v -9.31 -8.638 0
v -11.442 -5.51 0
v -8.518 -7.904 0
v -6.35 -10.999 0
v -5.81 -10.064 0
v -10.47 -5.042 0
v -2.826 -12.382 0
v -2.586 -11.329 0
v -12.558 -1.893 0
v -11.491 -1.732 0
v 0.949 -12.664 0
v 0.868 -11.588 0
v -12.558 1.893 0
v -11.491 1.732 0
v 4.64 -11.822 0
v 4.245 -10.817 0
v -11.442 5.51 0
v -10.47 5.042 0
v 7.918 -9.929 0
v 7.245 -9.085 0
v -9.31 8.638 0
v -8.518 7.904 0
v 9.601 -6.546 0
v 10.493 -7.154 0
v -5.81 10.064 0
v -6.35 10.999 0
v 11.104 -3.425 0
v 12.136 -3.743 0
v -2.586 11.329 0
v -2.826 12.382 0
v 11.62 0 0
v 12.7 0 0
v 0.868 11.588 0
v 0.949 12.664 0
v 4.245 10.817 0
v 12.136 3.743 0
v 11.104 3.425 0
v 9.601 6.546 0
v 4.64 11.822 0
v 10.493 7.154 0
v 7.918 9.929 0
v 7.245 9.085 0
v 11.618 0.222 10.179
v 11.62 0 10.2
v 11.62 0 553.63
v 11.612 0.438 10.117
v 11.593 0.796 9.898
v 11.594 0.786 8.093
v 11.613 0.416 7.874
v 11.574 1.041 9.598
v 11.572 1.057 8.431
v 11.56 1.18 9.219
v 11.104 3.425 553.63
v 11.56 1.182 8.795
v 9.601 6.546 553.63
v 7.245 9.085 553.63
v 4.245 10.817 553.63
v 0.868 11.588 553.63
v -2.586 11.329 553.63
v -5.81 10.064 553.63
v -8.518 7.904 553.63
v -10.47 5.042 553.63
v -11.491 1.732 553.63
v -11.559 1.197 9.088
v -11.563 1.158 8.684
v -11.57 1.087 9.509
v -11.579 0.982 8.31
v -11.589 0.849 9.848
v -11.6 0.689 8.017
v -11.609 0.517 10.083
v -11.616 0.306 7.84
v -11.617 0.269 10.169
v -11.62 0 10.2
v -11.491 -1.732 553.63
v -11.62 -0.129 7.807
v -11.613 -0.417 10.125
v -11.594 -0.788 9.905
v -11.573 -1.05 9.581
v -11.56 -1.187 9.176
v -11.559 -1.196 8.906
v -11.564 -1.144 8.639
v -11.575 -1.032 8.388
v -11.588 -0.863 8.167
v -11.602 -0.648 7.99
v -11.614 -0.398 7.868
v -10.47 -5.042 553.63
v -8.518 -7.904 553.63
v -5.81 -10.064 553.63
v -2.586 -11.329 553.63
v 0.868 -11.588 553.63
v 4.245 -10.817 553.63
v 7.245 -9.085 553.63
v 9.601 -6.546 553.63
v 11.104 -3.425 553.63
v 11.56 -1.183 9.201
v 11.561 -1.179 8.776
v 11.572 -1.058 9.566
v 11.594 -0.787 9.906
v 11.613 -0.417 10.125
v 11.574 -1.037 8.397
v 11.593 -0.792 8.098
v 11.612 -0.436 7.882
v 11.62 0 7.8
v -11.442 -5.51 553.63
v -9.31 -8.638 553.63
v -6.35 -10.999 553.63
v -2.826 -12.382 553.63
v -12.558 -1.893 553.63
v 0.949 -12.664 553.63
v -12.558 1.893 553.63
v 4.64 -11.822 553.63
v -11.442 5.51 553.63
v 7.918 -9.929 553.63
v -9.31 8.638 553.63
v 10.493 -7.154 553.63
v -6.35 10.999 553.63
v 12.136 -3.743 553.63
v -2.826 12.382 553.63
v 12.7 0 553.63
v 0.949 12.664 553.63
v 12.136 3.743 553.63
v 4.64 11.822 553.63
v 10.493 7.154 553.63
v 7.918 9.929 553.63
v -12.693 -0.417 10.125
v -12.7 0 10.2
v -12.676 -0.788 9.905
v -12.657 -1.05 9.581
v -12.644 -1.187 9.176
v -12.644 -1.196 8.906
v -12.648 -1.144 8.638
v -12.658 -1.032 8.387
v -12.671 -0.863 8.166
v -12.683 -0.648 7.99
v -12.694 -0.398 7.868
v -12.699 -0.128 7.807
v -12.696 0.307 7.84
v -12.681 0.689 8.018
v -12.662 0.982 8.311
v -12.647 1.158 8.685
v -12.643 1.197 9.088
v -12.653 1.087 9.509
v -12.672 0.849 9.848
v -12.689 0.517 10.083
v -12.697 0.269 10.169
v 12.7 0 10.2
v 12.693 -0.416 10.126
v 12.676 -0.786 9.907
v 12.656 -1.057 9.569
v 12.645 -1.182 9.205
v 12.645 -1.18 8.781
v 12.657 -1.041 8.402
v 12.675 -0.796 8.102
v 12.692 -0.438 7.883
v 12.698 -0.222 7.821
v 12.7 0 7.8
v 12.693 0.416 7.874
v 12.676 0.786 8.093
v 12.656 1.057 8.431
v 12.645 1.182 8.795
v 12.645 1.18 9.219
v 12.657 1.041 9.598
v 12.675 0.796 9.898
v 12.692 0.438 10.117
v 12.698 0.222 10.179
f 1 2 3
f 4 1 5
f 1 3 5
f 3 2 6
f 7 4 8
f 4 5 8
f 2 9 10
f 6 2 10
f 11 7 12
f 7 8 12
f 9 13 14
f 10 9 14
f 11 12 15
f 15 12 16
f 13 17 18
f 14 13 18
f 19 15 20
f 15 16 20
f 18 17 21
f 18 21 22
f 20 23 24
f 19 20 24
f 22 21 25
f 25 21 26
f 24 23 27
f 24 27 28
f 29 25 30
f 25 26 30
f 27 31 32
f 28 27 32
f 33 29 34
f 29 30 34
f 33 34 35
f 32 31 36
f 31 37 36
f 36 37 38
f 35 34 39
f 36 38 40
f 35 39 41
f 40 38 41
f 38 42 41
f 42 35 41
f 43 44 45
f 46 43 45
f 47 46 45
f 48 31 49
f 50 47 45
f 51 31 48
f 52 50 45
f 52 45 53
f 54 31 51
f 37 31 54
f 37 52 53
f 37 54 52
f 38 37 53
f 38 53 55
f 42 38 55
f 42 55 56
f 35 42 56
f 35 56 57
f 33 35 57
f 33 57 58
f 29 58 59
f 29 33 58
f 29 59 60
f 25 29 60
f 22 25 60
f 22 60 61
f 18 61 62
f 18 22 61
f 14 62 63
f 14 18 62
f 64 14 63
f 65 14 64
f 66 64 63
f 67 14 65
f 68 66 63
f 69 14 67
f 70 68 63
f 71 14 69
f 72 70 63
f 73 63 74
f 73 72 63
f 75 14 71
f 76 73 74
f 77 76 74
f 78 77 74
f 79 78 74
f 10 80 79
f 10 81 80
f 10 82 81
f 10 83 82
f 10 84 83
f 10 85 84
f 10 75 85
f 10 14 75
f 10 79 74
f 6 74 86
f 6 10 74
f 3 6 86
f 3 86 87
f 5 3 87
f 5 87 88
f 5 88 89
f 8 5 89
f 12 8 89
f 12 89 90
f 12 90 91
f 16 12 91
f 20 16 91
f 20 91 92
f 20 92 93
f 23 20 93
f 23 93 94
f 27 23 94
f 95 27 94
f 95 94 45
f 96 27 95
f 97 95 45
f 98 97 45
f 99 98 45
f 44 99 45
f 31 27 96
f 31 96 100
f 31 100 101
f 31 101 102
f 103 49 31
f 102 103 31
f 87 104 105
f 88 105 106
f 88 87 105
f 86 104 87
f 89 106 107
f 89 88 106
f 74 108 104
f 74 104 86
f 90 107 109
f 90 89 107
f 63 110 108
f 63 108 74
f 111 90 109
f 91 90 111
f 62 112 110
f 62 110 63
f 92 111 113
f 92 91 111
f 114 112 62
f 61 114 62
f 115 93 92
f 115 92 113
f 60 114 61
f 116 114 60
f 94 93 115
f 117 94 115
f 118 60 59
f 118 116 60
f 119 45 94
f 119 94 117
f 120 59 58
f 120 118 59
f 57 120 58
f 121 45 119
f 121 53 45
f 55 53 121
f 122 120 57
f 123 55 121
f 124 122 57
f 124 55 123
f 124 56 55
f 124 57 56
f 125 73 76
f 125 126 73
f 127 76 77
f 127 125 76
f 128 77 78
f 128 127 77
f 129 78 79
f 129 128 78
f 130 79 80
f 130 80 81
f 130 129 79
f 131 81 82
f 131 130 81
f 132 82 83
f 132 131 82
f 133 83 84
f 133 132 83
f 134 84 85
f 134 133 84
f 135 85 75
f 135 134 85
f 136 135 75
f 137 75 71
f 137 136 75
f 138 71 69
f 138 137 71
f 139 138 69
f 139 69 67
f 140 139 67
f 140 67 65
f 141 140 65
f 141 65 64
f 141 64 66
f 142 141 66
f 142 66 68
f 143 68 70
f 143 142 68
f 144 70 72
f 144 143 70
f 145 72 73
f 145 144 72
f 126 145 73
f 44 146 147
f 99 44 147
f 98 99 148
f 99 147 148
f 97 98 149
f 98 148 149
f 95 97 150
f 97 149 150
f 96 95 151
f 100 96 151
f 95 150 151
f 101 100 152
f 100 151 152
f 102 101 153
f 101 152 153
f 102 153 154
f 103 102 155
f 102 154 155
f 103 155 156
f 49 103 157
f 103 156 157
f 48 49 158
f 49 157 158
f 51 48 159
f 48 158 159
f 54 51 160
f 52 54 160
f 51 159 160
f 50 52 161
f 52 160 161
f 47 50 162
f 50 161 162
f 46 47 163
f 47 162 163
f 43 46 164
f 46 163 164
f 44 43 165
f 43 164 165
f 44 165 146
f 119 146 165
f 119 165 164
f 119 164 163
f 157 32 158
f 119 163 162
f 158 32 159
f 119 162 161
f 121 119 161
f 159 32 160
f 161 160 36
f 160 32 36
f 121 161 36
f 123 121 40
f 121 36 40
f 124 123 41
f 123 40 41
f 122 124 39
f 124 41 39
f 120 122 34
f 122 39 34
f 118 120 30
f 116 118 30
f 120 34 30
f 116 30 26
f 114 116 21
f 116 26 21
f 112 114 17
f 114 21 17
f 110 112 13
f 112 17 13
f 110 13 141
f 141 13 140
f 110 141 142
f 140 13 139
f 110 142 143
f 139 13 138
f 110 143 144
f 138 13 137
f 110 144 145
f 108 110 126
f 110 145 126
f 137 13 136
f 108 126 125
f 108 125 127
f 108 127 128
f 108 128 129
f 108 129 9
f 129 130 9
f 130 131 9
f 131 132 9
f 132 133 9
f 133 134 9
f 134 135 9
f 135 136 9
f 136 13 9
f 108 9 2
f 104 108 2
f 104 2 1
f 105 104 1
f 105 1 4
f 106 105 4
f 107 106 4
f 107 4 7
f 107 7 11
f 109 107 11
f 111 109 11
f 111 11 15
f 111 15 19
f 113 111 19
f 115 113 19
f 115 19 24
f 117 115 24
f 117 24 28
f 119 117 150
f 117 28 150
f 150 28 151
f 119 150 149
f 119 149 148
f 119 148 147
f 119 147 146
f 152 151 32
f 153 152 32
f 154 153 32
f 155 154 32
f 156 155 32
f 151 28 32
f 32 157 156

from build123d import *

# Parameters (mm, degrees)
SKETCH1_R           = 12.7
SKETCH1_R_2         = 11.6205
BOSS_EXTRUDE1_DEPTH = 553.63
SKETCH3_W           = 1.2
SKETCH3_H           = 12.7


with BuildPart() as part:
    # Sketch1 → Boss-Extrude1 (new body)
    with BuildSketch(Plane.XY):
        Circle(SKETCH1_R)
        Circle(SKETCH1_R_2, mode=Mode.SUBTRACT)
    extrude(amount=BOSS_EXTRUDE1_DEPTH)

    # Sketch3 → M2 Clearance Hole1 (revolve, cut)
    with BuildSketch(Plane(origin=(0, 0, 9), x_dir=(0, 0, 1), z_dir=(0, 1, 0))):
        with Locations((0.6, 6.35)):
            Rectangle(SKETCH3_W, SKETCH3_H)
    m2_clearance_hole1 = revolve(axis=Axis((-6.35, 0, 9), (1, 0, 0)), mode=Mode.SUBTRACT)

    # Mirror1: M2 Clearance Hole1 across plane
    add(m2_clearance_hole1.mirror(Plane(origin=(0, 0, 0), x_dir=(0, 0, 1), z_dir=(1, 0, 0))), mode=Mode.SUBTRACT)


solid = part.part
